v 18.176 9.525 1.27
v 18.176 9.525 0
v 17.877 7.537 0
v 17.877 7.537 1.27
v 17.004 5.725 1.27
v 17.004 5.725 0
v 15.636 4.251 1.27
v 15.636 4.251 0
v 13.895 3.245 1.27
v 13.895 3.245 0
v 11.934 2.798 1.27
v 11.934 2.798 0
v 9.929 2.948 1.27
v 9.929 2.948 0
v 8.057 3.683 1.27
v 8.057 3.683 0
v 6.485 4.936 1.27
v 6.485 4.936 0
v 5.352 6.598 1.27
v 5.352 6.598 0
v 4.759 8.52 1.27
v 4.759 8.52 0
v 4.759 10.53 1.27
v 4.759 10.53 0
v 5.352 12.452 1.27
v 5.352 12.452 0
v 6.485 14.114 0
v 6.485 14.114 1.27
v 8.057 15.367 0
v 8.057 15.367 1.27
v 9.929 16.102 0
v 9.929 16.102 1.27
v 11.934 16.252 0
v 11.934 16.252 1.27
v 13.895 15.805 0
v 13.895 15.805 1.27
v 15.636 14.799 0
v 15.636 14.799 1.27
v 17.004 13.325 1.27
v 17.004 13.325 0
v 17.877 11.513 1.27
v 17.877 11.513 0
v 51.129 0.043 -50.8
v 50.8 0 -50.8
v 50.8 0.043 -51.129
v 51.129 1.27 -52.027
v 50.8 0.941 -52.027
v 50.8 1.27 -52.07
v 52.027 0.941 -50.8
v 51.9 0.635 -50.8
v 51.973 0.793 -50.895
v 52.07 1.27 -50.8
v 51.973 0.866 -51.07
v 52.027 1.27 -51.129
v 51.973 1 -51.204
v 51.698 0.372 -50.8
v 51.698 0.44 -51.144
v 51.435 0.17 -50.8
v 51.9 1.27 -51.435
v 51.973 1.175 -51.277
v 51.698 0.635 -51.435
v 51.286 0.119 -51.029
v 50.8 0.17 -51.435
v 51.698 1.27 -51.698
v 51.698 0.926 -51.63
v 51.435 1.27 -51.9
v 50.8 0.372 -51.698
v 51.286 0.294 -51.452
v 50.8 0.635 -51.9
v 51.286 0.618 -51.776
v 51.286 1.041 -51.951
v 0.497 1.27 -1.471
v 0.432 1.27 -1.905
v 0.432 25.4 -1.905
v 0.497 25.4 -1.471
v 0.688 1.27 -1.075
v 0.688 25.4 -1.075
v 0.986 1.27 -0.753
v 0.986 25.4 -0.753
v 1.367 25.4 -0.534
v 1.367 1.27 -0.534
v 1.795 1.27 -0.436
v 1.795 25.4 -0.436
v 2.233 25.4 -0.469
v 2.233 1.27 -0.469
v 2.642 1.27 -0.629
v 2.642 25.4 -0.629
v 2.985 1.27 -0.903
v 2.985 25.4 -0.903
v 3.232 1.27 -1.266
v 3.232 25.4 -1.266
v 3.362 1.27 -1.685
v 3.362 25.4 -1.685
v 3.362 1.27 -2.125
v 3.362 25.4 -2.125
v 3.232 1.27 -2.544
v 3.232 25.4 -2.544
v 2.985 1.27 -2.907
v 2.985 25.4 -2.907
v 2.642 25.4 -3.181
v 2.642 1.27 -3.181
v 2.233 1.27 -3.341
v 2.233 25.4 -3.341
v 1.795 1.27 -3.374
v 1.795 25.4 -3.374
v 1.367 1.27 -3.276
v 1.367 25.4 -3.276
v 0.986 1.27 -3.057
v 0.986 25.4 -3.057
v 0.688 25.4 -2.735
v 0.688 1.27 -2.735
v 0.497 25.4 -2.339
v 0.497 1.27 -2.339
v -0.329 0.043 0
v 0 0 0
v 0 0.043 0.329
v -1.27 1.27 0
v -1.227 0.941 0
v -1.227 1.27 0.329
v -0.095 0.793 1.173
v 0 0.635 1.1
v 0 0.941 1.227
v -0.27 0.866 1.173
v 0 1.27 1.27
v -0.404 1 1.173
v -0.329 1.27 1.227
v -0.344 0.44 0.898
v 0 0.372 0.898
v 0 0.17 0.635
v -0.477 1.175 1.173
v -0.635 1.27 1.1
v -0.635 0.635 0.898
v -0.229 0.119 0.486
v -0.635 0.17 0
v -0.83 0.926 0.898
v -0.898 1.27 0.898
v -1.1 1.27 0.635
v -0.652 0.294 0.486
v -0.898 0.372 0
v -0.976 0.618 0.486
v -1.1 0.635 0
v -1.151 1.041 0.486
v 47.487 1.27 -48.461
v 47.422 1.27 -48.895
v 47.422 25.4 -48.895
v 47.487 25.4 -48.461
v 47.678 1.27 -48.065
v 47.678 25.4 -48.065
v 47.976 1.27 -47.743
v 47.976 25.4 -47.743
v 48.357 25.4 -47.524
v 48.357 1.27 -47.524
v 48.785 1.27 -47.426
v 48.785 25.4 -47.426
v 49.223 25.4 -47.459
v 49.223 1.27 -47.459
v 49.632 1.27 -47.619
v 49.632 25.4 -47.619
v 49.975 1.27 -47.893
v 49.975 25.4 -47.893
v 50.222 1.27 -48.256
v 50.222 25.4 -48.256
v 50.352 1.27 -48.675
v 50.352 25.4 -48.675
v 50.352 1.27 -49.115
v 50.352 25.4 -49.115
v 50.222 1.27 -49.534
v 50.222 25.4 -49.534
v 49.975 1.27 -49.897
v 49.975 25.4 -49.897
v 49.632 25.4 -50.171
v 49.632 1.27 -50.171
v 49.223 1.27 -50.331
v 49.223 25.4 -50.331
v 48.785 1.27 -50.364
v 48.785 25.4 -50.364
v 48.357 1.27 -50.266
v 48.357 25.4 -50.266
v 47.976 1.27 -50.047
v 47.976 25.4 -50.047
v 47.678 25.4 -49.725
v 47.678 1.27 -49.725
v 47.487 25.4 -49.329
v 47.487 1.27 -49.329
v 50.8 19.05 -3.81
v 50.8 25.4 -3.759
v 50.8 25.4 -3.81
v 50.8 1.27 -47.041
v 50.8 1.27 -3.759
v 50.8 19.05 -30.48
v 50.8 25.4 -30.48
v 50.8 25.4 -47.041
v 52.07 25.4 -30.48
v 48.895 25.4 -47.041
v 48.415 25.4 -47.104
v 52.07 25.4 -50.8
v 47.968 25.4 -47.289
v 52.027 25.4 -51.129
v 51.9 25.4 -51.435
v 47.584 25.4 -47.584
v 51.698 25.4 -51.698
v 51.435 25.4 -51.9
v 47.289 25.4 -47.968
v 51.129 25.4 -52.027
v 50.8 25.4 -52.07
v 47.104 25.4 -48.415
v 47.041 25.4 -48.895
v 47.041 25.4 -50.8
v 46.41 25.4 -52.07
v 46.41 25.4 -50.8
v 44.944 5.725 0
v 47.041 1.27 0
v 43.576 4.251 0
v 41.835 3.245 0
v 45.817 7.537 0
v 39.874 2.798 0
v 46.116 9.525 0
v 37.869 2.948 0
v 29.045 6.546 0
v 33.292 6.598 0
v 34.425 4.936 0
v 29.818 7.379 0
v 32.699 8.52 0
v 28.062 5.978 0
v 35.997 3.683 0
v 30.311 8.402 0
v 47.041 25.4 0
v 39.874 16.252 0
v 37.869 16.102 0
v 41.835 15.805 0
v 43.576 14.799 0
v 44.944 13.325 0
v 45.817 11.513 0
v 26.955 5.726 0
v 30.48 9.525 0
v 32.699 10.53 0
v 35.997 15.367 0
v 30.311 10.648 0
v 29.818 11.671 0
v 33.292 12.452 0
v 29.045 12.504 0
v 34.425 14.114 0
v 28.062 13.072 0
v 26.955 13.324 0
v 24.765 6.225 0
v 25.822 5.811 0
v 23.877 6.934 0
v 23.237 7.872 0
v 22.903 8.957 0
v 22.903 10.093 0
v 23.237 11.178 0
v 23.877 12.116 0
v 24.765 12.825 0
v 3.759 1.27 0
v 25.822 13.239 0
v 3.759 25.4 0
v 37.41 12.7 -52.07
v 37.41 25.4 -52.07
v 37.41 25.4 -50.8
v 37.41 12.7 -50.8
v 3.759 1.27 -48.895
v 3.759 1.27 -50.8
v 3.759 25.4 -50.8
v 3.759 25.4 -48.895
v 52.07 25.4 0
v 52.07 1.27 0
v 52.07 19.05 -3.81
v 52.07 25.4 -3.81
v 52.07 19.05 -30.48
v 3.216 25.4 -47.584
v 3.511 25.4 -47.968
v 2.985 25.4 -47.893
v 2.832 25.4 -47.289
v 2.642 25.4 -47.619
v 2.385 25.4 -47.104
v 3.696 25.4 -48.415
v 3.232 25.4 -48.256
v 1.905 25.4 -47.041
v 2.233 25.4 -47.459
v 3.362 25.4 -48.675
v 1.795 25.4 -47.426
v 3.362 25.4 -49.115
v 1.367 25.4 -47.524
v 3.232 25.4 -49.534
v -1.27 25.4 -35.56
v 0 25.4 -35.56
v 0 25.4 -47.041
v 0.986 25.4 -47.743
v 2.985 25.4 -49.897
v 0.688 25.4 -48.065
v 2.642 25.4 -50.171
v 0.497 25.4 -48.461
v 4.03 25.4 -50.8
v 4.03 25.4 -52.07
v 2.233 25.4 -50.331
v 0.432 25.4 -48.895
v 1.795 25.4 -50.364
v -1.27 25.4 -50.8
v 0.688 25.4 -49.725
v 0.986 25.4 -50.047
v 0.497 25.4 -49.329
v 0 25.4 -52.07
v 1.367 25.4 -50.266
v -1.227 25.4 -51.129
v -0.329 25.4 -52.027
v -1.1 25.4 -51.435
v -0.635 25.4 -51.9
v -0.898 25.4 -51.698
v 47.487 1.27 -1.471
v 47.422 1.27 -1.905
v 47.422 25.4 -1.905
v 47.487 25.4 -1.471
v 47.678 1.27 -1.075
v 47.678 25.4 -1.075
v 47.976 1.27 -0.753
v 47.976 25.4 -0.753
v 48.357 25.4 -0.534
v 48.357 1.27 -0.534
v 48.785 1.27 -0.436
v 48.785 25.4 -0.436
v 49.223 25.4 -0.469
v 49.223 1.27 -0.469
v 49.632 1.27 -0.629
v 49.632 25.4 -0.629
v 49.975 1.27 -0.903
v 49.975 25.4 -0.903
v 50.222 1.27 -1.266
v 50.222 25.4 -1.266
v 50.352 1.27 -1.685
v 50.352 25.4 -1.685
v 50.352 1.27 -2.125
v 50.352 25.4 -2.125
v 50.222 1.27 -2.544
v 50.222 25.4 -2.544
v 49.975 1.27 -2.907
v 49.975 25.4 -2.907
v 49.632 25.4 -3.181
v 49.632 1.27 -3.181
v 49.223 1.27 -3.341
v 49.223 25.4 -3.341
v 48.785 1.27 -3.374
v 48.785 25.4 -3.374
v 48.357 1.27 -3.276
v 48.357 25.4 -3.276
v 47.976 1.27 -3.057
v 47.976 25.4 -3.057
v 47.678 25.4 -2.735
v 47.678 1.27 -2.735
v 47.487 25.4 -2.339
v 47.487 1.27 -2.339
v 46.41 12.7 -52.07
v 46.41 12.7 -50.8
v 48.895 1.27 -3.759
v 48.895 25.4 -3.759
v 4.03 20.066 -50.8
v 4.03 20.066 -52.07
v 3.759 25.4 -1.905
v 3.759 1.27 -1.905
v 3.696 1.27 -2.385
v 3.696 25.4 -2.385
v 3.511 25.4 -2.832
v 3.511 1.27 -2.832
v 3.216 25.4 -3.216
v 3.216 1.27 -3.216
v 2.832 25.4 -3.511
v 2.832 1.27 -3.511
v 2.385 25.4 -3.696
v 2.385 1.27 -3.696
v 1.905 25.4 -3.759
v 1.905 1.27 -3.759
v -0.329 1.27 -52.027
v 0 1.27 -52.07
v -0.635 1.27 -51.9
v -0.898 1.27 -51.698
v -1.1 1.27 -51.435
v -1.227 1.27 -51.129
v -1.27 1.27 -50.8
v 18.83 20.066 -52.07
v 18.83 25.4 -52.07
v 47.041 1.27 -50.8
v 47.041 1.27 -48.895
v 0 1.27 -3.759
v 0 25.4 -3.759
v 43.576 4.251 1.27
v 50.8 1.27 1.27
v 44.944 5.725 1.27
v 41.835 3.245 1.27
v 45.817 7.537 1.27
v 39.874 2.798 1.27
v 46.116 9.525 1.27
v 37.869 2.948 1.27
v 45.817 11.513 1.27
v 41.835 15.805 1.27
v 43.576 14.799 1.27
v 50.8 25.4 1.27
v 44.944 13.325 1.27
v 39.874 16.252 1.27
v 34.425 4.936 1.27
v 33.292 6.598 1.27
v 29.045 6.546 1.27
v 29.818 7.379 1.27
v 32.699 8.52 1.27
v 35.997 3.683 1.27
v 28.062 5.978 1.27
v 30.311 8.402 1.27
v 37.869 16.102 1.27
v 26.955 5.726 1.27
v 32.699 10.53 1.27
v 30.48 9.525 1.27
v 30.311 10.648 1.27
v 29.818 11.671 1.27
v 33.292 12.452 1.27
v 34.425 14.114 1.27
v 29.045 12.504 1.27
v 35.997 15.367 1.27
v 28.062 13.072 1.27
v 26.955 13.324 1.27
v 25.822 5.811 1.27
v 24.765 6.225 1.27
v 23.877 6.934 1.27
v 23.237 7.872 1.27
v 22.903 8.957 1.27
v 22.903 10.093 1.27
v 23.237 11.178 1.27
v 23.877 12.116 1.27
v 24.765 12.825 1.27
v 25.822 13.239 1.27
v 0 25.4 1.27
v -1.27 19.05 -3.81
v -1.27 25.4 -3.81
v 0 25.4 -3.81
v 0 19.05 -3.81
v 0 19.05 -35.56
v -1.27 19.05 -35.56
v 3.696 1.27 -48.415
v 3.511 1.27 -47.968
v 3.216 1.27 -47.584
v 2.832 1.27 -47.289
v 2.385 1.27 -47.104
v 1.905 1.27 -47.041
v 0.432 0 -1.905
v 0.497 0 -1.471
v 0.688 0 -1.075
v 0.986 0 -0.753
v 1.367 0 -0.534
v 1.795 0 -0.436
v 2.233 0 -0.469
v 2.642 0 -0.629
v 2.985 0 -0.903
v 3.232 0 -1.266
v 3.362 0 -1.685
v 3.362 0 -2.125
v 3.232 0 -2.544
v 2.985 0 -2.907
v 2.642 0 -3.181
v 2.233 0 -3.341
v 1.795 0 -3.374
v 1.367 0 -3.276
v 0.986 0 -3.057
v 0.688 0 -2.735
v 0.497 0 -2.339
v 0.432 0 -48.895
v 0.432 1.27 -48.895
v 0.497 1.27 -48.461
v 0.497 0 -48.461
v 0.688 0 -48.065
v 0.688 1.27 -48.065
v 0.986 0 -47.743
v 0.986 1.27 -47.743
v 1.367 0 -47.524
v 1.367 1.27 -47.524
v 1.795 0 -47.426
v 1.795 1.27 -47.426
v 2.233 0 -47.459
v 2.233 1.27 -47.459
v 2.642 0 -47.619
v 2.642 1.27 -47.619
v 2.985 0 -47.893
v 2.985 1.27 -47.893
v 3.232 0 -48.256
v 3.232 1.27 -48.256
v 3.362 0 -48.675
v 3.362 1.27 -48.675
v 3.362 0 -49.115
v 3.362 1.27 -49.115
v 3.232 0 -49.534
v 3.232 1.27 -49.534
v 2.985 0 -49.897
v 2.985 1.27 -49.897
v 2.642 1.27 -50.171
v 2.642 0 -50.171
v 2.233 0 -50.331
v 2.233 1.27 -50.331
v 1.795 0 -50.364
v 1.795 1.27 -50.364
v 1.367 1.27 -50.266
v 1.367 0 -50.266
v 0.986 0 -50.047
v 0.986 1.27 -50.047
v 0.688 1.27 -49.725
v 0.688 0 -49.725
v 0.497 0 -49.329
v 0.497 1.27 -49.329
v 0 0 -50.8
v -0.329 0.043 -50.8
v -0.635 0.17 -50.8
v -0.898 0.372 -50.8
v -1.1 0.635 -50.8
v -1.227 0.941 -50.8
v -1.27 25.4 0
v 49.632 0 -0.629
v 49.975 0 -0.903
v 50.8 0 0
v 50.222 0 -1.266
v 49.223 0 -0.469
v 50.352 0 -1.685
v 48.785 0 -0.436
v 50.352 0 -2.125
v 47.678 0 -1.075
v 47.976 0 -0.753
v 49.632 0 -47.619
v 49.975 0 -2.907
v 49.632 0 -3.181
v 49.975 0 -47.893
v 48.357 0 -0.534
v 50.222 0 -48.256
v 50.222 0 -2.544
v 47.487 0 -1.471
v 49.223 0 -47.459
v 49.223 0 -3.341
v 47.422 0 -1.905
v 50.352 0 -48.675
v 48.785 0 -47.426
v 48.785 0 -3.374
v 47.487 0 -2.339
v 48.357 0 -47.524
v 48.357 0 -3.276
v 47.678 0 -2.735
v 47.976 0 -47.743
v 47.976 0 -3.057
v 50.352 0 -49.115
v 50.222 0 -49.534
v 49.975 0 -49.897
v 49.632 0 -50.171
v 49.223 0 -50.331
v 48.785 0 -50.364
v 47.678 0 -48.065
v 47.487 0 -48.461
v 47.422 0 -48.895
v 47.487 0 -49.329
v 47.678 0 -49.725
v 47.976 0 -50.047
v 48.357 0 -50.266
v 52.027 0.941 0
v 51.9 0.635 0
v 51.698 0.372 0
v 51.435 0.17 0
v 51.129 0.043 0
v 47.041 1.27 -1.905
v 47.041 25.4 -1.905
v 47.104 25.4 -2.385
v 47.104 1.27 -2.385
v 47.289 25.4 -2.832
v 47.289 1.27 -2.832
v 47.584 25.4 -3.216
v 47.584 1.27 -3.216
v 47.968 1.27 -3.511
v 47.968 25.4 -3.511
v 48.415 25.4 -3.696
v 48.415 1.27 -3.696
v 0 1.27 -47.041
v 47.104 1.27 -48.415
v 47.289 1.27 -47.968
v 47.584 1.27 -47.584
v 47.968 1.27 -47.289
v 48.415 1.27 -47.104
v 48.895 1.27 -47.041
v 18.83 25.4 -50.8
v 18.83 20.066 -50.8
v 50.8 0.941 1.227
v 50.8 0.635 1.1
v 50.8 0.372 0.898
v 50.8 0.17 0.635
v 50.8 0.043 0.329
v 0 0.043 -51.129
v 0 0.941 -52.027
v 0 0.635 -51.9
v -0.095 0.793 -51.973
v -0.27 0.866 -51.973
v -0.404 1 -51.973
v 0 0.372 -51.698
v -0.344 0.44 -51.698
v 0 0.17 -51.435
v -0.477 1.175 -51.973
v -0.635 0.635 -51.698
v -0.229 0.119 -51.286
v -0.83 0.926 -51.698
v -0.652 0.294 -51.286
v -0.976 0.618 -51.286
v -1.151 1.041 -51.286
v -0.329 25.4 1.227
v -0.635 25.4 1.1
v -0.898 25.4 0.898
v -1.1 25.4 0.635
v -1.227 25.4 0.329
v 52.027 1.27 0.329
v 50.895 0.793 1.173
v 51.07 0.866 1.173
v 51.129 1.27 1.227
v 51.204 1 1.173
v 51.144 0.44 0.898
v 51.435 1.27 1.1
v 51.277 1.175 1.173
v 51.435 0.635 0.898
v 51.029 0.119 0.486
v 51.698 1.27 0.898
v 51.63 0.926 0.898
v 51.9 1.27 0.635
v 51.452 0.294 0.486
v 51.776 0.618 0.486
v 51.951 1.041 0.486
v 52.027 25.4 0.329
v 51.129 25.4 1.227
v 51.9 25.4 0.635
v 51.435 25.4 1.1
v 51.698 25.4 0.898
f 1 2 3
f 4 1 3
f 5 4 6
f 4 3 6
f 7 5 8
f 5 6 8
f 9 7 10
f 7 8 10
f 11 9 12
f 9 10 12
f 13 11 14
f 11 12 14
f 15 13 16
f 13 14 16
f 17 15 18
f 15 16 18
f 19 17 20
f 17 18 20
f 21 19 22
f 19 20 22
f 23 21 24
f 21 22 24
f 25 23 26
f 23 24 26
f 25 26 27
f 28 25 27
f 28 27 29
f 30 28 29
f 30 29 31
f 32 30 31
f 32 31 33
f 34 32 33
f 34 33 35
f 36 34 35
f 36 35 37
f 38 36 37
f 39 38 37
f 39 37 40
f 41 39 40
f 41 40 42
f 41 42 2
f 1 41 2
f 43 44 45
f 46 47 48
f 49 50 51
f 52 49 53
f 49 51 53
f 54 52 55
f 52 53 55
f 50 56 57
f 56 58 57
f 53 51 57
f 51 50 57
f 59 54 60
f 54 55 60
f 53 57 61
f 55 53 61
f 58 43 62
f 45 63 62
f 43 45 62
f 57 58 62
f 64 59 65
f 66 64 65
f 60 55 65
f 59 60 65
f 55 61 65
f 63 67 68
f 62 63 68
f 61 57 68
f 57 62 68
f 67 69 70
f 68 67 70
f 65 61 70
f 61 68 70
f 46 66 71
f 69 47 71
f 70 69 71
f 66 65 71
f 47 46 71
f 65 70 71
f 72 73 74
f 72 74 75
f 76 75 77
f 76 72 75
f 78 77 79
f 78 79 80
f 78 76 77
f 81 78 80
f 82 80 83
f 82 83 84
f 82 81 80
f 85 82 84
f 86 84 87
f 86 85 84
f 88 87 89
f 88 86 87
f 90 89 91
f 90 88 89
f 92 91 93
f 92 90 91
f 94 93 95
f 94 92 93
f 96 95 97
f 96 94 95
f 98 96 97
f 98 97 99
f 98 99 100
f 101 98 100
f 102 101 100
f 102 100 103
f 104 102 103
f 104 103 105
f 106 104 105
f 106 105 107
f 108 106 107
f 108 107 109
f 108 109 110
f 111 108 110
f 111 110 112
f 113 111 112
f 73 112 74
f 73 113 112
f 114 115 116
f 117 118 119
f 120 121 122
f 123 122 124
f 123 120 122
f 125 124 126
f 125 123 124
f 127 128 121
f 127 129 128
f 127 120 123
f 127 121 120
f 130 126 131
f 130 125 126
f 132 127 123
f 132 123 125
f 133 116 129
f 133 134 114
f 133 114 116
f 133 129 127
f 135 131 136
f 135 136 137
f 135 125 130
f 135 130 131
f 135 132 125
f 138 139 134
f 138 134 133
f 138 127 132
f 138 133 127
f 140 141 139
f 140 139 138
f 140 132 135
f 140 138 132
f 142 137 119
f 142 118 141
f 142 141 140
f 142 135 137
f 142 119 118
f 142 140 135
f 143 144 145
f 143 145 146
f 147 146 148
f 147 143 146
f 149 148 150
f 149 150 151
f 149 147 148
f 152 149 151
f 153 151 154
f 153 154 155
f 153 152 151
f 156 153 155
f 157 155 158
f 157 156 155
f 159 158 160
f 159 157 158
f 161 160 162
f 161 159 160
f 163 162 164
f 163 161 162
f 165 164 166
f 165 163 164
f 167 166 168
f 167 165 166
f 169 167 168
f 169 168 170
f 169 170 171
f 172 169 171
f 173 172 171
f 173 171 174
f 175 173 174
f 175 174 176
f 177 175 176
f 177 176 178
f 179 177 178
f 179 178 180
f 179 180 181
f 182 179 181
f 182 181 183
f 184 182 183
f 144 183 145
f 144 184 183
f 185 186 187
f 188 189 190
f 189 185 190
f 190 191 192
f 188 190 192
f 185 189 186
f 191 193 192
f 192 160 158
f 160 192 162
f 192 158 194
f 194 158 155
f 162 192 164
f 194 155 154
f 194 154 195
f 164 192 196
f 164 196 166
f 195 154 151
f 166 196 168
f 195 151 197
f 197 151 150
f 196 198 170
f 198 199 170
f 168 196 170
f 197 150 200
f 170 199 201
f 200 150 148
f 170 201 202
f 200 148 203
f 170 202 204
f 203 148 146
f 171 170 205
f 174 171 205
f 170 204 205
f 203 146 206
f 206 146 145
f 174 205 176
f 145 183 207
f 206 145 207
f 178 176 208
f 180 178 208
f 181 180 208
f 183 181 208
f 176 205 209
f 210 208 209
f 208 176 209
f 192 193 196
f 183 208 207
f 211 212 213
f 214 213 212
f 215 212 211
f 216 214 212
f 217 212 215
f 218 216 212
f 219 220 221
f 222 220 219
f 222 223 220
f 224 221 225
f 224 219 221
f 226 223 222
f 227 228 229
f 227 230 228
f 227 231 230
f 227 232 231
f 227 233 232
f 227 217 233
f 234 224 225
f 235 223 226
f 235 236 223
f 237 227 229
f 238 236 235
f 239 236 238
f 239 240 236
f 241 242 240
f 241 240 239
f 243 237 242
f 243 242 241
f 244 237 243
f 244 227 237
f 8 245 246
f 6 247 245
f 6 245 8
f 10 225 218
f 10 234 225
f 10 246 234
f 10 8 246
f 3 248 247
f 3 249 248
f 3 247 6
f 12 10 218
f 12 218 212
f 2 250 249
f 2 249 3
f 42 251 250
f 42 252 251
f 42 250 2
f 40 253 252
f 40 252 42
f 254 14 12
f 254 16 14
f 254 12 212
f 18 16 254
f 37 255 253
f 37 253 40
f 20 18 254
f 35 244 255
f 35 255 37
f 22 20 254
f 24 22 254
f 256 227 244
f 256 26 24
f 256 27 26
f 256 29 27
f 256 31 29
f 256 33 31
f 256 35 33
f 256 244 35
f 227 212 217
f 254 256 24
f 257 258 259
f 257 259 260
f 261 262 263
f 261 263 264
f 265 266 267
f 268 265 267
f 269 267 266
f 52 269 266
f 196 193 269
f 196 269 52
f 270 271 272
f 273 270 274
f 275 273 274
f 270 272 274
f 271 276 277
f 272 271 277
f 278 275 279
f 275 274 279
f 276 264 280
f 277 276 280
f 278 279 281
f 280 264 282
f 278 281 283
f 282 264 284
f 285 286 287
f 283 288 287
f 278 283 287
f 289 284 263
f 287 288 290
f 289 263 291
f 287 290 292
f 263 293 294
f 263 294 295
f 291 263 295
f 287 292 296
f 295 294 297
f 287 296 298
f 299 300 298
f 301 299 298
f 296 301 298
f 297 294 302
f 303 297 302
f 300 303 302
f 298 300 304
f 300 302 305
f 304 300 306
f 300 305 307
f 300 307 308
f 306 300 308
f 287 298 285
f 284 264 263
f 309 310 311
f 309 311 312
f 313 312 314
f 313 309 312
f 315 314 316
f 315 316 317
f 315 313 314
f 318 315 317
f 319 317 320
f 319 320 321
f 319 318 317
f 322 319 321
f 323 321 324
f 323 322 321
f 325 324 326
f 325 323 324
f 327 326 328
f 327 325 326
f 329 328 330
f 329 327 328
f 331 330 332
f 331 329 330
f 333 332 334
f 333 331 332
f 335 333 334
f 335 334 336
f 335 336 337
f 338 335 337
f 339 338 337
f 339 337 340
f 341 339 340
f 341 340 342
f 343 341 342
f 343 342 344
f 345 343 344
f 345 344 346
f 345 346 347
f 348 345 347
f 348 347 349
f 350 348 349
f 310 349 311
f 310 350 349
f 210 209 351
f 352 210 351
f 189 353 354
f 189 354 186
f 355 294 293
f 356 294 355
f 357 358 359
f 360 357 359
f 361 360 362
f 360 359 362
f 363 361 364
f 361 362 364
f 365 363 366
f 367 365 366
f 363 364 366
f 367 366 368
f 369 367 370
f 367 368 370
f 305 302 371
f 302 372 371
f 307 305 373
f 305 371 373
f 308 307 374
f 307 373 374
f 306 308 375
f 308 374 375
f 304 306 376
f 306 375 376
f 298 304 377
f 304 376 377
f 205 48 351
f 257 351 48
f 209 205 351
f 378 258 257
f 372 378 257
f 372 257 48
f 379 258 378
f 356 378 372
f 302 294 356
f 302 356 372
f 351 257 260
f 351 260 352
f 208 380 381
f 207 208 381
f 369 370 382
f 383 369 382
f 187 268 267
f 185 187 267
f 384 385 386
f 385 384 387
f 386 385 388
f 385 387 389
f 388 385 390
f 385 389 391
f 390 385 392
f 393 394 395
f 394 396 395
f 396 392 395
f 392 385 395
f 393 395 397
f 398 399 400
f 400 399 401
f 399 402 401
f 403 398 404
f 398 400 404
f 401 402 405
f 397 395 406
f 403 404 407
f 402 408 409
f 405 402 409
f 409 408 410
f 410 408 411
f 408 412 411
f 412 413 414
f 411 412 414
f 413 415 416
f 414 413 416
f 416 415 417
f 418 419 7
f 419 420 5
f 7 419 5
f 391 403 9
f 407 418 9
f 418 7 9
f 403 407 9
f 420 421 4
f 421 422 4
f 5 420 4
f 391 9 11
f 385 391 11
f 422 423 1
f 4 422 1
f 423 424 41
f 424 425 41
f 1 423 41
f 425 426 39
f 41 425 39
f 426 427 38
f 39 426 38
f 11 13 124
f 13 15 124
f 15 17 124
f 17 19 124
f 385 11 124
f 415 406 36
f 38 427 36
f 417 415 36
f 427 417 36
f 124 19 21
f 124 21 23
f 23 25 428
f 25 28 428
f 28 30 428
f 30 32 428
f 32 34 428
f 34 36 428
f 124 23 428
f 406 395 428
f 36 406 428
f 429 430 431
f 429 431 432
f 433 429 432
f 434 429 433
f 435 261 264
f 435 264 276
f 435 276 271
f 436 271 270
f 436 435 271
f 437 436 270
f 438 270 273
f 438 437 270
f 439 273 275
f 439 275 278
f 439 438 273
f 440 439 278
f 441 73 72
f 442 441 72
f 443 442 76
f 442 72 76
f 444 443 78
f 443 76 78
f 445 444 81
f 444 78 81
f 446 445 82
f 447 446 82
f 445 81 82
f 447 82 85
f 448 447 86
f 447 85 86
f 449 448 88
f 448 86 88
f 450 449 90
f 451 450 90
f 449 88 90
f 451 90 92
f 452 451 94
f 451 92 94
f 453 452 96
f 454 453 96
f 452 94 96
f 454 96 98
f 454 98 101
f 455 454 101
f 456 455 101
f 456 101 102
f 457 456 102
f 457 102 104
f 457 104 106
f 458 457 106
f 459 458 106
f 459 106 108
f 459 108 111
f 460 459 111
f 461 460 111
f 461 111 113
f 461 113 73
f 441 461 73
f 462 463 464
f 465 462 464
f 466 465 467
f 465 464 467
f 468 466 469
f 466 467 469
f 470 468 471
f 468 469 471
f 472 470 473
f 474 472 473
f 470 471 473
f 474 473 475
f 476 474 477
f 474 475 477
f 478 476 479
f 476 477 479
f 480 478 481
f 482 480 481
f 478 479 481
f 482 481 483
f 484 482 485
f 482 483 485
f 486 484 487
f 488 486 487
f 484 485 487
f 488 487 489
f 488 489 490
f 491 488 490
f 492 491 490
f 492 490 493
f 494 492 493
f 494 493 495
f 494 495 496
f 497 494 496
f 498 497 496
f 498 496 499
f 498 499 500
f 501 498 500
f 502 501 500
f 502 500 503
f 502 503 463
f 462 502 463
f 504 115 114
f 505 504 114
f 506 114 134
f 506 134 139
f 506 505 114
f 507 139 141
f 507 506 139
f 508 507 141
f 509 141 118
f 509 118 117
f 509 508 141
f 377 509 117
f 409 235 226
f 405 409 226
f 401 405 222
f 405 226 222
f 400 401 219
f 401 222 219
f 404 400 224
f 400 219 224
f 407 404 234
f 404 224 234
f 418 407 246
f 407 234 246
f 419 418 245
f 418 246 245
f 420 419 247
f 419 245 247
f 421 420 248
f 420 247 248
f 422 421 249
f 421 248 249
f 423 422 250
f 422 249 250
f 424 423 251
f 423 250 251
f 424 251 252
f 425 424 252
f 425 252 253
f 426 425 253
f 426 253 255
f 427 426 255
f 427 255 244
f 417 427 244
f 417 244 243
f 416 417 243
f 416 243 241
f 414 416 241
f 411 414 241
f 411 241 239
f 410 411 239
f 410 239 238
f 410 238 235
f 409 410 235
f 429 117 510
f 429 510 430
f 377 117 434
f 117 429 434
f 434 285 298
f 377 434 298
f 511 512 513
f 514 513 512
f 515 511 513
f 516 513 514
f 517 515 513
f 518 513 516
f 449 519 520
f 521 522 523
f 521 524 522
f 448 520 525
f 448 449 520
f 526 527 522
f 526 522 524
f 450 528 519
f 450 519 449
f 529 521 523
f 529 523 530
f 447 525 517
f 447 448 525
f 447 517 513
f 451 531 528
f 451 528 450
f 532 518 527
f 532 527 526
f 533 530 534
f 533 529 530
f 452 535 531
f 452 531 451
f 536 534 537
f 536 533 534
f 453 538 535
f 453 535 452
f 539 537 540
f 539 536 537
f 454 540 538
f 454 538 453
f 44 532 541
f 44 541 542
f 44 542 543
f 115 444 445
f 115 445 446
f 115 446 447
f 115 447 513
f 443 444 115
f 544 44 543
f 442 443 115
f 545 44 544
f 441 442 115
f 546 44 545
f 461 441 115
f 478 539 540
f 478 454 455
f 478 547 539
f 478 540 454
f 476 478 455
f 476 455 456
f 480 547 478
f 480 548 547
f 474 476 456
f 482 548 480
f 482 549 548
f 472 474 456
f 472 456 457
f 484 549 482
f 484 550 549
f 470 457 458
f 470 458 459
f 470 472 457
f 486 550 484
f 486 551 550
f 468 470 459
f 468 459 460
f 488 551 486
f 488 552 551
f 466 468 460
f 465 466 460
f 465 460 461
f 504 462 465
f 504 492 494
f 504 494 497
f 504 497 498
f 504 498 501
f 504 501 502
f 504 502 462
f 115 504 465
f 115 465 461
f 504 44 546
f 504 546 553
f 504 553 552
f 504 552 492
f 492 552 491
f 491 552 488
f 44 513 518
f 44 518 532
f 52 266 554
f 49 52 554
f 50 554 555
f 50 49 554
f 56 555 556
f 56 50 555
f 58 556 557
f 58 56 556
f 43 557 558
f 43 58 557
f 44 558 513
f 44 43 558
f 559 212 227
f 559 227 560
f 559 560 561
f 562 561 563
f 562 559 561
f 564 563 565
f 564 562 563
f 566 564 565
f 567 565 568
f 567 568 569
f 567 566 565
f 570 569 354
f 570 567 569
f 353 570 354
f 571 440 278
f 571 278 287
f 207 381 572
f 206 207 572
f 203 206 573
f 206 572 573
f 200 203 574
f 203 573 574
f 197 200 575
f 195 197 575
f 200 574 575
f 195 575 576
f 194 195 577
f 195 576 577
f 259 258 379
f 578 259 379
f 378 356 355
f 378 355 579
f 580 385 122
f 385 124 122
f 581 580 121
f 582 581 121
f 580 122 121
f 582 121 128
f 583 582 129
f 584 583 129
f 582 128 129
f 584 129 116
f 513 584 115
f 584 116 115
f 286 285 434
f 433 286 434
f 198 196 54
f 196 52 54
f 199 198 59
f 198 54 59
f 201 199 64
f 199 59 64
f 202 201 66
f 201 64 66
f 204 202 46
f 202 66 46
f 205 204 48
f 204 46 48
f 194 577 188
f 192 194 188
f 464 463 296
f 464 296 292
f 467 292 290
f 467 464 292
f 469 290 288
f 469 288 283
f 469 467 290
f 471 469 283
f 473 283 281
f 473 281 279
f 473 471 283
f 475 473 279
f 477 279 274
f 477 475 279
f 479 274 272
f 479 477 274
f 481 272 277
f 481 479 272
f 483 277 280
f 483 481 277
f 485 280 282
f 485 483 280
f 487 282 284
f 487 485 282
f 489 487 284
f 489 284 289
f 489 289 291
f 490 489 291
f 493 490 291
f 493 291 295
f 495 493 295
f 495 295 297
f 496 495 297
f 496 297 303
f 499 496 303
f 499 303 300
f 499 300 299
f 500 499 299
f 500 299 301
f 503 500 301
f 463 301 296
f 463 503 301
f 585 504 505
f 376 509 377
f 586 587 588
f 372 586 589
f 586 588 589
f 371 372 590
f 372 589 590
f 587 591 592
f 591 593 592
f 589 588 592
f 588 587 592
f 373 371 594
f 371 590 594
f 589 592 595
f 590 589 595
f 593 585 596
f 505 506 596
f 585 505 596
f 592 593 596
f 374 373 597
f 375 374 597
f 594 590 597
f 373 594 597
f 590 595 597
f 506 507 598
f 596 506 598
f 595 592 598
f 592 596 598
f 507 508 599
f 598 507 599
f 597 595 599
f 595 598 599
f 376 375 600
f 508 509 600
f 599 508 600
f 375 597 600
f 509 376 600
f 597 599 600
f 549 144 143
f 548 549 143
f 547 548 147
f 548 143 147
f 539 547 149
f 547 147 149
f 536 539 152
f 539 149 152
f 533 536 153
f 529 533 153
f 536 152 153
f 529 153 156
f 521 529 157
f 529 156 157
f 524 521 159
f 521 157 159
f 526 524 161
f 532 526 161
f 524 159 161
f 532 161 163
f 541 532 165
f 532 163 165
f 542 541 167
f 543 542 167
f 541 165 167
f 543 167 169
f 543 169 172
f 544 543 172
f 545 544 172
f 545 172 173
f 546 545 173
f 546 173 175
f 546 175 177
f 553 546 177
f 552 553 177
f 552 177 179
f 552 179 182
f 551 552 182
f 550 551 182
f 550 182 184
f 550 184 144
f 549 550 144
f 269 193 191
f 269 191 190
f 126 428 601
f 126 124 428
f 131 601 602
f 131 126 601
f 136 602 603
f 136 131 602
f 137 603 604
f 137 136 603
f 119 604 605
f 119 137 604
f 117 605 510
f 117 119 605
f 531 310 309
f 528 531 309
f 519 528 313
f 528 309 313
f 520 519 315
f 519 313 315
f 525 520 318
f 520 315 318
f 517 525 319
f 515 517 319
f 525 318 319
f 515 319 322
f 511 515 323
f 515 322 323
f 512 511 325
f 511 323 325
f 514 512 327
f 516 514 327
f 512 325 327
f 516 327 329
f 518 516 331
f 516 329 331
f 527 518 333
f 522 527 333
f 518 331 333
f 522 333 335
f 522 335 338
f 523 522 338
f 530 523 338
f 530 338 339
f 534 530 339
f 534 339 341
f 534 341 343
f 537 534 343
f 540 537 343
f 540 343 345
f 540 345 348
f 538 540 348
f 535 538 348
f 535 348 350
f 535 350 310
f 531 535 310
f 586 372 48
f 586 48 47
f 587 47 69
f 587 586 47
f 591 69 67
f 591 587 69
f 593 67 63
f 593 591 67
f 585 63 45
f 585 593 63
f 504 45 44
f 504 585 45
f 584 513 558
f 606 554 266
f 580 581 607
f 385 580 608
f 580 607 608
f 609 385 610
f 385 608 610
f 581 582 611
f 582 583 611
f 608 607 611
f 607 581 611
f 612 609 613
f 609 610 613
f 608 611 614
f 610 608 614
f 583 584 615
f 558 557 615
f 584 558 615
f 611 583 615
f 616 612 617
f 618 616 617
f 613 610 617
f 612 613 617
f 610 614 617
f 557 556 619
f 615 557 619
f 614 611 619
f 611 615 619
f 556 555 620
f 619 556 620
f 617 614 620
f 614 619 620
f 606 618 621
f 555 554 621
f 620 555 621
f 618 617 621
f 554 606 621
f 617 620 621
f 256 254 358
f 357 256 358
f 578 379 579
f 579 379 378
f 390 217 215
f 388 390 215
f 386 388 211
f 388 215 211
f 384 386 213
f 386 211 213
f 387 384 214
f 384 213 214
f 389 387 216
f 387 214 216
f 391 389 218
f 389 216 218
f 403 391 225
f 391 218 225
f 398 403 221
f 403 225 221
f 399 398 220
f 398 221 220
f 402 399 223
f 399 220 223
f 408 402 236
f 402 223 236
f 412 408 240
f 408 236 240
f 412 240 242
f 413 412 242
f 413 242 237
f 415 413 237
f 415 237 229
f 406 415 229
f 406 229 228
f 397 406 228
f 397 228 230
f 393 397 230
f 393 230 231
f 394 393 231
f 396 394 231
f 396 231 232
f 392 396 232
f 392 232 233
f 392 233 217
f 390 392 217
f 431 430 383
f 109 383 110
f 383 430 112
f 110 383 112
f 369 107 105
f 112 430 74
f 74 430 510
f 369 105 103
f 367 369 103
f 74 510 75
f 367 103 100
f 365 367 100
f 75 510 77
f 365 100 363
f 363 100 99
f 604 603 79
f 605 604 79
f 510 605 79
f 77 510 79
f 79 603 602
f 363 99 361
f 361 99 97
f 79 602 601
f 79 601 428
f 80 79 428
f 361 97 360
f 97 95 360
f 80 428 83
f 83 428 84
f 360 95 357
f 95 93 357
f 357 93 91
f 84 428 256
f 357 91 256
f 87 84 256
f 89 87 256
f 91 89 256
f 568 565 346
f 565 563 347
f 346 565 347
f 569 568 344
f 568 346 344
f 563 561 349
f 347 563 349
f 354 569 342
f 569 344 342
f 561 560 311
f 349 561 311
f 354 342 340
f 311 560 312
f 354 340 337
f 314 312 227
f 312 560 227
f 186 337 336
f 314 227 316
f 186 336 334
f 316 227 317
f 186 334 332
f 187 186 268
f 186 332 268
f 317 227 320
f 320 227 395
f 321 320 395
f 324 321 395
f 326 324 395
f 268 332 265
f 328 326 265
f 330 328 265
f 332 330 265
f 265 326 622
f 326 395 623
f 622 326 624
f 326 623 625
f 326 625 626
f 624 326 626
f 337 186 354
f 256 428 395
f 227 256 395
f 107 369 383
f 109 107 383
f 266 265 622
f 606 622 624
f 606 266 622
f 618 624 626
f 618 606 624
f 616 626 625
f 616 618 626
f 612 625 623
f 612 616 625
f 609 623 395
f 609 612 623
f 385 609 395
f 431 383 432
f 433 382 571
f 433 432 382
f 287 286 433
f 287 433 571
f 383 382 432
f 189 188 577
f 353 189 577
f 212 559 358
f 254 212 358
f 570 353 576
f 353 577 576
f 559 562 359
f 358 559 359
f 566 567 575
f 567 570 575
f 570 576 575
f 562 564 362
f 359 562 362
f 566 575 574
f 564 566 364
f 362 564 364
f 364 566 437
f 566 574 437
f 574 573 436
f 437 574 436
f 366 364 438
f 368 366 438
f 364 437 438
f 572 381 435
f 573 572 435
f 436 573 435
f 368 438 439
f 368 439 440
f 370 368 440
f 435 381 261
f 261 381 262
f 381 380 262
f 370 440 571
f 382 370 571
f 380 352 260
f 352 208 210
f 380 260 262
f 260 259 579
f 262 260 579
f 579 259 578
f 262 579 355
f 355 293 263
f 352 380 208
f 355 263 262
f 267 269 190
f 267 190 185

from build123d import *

# Parameters (mm, degrees)
SKETCH4_W                        = 53.34
SKETCH4_H                        = 53.34
BOSS_EXTRUDE2_DEPTH              = 25.4
SHELL1_T                         = -1.27
SKETCH13_W                       = 14.8000212
SKETCH13_H                       = 5.334
SKETCH13_W_2                     = 8.999982
SKETCH13_H_2                     = 12.7
CUT_EXTRUDE5_DEPTH               = 1.27
F_1_2_CLEARANCE_HOLE2_D          = 13.49248
F_1_2_CLEARANCE_HOLE2_DEPTH      = 1.27
F_97_0_0059_DIAMETER_HOLE1_D     = 7.62
F_97_0_0059_DIAMETER_HOLE1_DEPTH = 1.27
FILLET2_R                        = 1.27
CUT_EXTRUDE6_REACH               = 55.34
SKETCH24_W                       = 31.75
SKETCH24_H                       = 6.35
CUT_EXTRUDE7_REACH               = 55.34
SKETCH26_W                       = 26.67
SKETCH26_H                       = 6.35
SKETCH27_R                       = 1.4732
BOSS_EXTRUDE3_DEPTH              = 24.13
SKETCH28_R                       = 1.4732
CUT_EXTRUDE8_DEPTH               = 26.4
BODY_MOVE_COPY1_ANGLE            = 180


with BuildPart() as part:
    # Sketch4 → Boss-Extrude2 (new body)
    with BuildSketch(Plane(origin=(0, 0, 0), x_dir=(1, 0, 0), z_dir=(0, 1, 0))):
        with Locations((25.4, 25.4)):
            Rectangle(SKETCH4_W, SKETCH4_H)
    extrude(amount=BOSS_EXTRUDE2_DEPTH)

    # Shell1
    shell1_openings = [part.faces().sort_by_distance(p)[0] for p in [
        (25.4, 0, -25.4),
    ]]
    offset(amount=SHELL1_T, openings=shell1_openings, kind=Kind.INTERSECTION)

    # Sketch13 → Cut-Extrude5 (cut)
    with BuildSketch(Plane(origin=(0, 0, -52.07), x_dir=(-1, 0, 0), z_dir=(0, 0, -1))):
        with Locations((-39.37, 2.667)):
            Rectangle(SKETCH13_W, SKETCH13_H)
        with Locations((-8.89, 6.35)):
            Rectangle(SKETCH13_W_2, SKETCH13_H_2)
    extrude(amount=-CUT_EXTRUDE5_DEPTH, mode=Mode.SUBTRACT)

    # 1/2 Clearance Hole2
    with Locations(Plane.XY.offset(1.27)):
        with Locations((11.43, 15.875), (39.37, 15.875)):
            Hole(F_1_2_CLEARANCE_HOLE2_D / 2, depth=F_1_2_CLEARANCE_HOLE2_DEPTH)

    # #97 (0.0059) Diameter Hole1
    with Locations(Plane.XY.offset(1.27)):
        with Locations((24.13, 15.875)):
            Hole(F_97_0_0059_DIAMETER_HOLE1_D / 2, depth=F_97_0_0059_DIAMETER_HOLE1_DEPTH)

    # Fillet2
    fillet2_edges = [part.edges().sort_by_distance(p)[0] for p in [
        (52.07, 25.4, -25.4),
        (25.4, 25.4, -52.07),
        (-1.27, 25.4, -25.4),
        (25.4, 25.4, 1.27),
        (-1.27, 12.7, -52.07),
        (52.07, 12.7, -52.07),
        (52.07, 12.7, 1.27),
        (-1.27, 12.7, 1.27),
    ]]
    fillet(fillet2_edges, radius=FILLET2_R)

    # Sketch24 → Cut-Extrude6 (cut, up to next)
    with BuildSketch(Plane(origin=(52.07, 0, 0), x_dir=(0, 0, -1), z_dir=(1, 0, 0)), mode=Mode.PRIVATE) as cut_extrude6_sk1:
        with Locations((19.685, 3.175)):
            Rectangle(SKETCH24_W, SKETCH24_H)
    cut_extrude6_tool1 = extrude(cut_extrude6_sk1.sketch, amount=-CUT_EXTRUDE6_REACH, mode=Mode.PRIVATE) & part.part
    add(cut_extrude6_tool1.solids().sort_by_distance((52.07, 3.175, -19.685))[0], mode=Mode.SUBTRACT)

    # Sketch26 → Cut-Extrude7 (cut, up to next)
    with BuildSketch(Plane.ZY.offset(1.27), mode=Mode.PRIVATE) as cut_extrude7_sk1:
        with Locations((-17.145, 3.175)):
            Rectangle(SKETCH26_W, SKETCH26_H)
    cut_extrude7_tool1 = extrude(cut_extrude7_sk1.sketch, amount=-CUT_EXTRUDE7_REACH, mode=Mode.PRIVATE) & part.part
    add(cut_extrude7_tool1.solids().sort_by_distance((-1.27, 3.175, -17.145))[0], mode=Mode.SUBTRACT)

    # Sketch27 → Boss-Extrude3 (add)
    with BuildSketch(Plane.XZ.offset(-24.13)):
        with BuildLine():
            Line((1.905, -3.7592), (0, -3.7592))
            Line((0, -3.7592), (0, 0))
            Line((0, 0), (3.7592, 0))
            Line((3.7592, 0), (3.7592, -1.905))
            ThreePointArc((3.7592, -1.905), (3.216117394, -3.216117394), (1.905, -3.7592))
        make_face()
        with Locations((1.905, -1.905)):
            Circle(SKETCH27_R, mode=Mode.SUBTRACT)
        with BuildLine():
            Line((0, -47.0408), (0, -50.8))
            Line((0, -50.8), (3.7592, -50.8))
            Line((3.7592, -50.8), (3.7592, -48.895))
            ThreePointArc((3.7592, -48.895), (3.216117394, -47.583882606), (1.905, -47.0408))
            Line((1.905, -47.0408), (0, -47.0408))
        make_face()
        with Locations((1.905, -48.895)):
            Circle(SKETCH27_R, mode=Mode.SUBTRACT)
        with BuildLine():
            Line((50.8, -50.8), (47.0408, -50.8))
            Line((47.0408, -50.8), (47.0408, -48.895))
            ThreePointArc((47.0408, -48.895), (47.583882606, -47.583882606), (48.895, -47.0408))
            Line((48.895, -47.0408), (50.8, -47.0408))
            Line((50.8, -47.0408), (50.8, -50.8))
        make_face()
        with Locations((48.895, -48.895)):
            Circle(SKETCH27_R, mode=Mode.SUBTRACT)
        with BuildLine():
            Line((47.0408, 0), (47.0408, -1.905))
            ThreePointArc((47.0408, -1.905), (47.583882606, -3.216117394), (48.895, -3.7592))
            Line((48.895, -3.7592), (50.8, -3.7592))
            Line((50.8, -3.7592), (50.8, 0))
            Line((50.8, 0), (47.0408, 0))
        make_face()
        with Locations((48.895, -1.905)):
            Circle(SKETCH27_R, mode=Mode.SUBTRACT)
    extrude(amount=BOSS_EXTRUDE3_DEPTH)

    # Sketch28 → Cut-Extrude8 (cut, through all)
    with BuildSketch(Plane.XZ):
        with Locations((48.895, -1.905)):
            Circle(SKETCH28_R)
        with Locations((1.905, -1.905)):
            Circle(SKETCH28_R)
        with Locations((1.905, -48.895)):
            Circle(SKETCH28_R)
        with Locations((48.895, -48.895)):
            Circle(SKETCH28_R)
    extrude(amount=-CUT_EXTRUDE8_DEPTH, mode=Mode.SUBTRACT)


with BuildPart() as part_1:
    # Body-Move/Copy1: moved
    add(part.part.rotate(Axis((25.4, 12.7, 0), (0, 0, 1)), BODY_MOVE_COPY1_ANGLE))


solid = part_1.part
